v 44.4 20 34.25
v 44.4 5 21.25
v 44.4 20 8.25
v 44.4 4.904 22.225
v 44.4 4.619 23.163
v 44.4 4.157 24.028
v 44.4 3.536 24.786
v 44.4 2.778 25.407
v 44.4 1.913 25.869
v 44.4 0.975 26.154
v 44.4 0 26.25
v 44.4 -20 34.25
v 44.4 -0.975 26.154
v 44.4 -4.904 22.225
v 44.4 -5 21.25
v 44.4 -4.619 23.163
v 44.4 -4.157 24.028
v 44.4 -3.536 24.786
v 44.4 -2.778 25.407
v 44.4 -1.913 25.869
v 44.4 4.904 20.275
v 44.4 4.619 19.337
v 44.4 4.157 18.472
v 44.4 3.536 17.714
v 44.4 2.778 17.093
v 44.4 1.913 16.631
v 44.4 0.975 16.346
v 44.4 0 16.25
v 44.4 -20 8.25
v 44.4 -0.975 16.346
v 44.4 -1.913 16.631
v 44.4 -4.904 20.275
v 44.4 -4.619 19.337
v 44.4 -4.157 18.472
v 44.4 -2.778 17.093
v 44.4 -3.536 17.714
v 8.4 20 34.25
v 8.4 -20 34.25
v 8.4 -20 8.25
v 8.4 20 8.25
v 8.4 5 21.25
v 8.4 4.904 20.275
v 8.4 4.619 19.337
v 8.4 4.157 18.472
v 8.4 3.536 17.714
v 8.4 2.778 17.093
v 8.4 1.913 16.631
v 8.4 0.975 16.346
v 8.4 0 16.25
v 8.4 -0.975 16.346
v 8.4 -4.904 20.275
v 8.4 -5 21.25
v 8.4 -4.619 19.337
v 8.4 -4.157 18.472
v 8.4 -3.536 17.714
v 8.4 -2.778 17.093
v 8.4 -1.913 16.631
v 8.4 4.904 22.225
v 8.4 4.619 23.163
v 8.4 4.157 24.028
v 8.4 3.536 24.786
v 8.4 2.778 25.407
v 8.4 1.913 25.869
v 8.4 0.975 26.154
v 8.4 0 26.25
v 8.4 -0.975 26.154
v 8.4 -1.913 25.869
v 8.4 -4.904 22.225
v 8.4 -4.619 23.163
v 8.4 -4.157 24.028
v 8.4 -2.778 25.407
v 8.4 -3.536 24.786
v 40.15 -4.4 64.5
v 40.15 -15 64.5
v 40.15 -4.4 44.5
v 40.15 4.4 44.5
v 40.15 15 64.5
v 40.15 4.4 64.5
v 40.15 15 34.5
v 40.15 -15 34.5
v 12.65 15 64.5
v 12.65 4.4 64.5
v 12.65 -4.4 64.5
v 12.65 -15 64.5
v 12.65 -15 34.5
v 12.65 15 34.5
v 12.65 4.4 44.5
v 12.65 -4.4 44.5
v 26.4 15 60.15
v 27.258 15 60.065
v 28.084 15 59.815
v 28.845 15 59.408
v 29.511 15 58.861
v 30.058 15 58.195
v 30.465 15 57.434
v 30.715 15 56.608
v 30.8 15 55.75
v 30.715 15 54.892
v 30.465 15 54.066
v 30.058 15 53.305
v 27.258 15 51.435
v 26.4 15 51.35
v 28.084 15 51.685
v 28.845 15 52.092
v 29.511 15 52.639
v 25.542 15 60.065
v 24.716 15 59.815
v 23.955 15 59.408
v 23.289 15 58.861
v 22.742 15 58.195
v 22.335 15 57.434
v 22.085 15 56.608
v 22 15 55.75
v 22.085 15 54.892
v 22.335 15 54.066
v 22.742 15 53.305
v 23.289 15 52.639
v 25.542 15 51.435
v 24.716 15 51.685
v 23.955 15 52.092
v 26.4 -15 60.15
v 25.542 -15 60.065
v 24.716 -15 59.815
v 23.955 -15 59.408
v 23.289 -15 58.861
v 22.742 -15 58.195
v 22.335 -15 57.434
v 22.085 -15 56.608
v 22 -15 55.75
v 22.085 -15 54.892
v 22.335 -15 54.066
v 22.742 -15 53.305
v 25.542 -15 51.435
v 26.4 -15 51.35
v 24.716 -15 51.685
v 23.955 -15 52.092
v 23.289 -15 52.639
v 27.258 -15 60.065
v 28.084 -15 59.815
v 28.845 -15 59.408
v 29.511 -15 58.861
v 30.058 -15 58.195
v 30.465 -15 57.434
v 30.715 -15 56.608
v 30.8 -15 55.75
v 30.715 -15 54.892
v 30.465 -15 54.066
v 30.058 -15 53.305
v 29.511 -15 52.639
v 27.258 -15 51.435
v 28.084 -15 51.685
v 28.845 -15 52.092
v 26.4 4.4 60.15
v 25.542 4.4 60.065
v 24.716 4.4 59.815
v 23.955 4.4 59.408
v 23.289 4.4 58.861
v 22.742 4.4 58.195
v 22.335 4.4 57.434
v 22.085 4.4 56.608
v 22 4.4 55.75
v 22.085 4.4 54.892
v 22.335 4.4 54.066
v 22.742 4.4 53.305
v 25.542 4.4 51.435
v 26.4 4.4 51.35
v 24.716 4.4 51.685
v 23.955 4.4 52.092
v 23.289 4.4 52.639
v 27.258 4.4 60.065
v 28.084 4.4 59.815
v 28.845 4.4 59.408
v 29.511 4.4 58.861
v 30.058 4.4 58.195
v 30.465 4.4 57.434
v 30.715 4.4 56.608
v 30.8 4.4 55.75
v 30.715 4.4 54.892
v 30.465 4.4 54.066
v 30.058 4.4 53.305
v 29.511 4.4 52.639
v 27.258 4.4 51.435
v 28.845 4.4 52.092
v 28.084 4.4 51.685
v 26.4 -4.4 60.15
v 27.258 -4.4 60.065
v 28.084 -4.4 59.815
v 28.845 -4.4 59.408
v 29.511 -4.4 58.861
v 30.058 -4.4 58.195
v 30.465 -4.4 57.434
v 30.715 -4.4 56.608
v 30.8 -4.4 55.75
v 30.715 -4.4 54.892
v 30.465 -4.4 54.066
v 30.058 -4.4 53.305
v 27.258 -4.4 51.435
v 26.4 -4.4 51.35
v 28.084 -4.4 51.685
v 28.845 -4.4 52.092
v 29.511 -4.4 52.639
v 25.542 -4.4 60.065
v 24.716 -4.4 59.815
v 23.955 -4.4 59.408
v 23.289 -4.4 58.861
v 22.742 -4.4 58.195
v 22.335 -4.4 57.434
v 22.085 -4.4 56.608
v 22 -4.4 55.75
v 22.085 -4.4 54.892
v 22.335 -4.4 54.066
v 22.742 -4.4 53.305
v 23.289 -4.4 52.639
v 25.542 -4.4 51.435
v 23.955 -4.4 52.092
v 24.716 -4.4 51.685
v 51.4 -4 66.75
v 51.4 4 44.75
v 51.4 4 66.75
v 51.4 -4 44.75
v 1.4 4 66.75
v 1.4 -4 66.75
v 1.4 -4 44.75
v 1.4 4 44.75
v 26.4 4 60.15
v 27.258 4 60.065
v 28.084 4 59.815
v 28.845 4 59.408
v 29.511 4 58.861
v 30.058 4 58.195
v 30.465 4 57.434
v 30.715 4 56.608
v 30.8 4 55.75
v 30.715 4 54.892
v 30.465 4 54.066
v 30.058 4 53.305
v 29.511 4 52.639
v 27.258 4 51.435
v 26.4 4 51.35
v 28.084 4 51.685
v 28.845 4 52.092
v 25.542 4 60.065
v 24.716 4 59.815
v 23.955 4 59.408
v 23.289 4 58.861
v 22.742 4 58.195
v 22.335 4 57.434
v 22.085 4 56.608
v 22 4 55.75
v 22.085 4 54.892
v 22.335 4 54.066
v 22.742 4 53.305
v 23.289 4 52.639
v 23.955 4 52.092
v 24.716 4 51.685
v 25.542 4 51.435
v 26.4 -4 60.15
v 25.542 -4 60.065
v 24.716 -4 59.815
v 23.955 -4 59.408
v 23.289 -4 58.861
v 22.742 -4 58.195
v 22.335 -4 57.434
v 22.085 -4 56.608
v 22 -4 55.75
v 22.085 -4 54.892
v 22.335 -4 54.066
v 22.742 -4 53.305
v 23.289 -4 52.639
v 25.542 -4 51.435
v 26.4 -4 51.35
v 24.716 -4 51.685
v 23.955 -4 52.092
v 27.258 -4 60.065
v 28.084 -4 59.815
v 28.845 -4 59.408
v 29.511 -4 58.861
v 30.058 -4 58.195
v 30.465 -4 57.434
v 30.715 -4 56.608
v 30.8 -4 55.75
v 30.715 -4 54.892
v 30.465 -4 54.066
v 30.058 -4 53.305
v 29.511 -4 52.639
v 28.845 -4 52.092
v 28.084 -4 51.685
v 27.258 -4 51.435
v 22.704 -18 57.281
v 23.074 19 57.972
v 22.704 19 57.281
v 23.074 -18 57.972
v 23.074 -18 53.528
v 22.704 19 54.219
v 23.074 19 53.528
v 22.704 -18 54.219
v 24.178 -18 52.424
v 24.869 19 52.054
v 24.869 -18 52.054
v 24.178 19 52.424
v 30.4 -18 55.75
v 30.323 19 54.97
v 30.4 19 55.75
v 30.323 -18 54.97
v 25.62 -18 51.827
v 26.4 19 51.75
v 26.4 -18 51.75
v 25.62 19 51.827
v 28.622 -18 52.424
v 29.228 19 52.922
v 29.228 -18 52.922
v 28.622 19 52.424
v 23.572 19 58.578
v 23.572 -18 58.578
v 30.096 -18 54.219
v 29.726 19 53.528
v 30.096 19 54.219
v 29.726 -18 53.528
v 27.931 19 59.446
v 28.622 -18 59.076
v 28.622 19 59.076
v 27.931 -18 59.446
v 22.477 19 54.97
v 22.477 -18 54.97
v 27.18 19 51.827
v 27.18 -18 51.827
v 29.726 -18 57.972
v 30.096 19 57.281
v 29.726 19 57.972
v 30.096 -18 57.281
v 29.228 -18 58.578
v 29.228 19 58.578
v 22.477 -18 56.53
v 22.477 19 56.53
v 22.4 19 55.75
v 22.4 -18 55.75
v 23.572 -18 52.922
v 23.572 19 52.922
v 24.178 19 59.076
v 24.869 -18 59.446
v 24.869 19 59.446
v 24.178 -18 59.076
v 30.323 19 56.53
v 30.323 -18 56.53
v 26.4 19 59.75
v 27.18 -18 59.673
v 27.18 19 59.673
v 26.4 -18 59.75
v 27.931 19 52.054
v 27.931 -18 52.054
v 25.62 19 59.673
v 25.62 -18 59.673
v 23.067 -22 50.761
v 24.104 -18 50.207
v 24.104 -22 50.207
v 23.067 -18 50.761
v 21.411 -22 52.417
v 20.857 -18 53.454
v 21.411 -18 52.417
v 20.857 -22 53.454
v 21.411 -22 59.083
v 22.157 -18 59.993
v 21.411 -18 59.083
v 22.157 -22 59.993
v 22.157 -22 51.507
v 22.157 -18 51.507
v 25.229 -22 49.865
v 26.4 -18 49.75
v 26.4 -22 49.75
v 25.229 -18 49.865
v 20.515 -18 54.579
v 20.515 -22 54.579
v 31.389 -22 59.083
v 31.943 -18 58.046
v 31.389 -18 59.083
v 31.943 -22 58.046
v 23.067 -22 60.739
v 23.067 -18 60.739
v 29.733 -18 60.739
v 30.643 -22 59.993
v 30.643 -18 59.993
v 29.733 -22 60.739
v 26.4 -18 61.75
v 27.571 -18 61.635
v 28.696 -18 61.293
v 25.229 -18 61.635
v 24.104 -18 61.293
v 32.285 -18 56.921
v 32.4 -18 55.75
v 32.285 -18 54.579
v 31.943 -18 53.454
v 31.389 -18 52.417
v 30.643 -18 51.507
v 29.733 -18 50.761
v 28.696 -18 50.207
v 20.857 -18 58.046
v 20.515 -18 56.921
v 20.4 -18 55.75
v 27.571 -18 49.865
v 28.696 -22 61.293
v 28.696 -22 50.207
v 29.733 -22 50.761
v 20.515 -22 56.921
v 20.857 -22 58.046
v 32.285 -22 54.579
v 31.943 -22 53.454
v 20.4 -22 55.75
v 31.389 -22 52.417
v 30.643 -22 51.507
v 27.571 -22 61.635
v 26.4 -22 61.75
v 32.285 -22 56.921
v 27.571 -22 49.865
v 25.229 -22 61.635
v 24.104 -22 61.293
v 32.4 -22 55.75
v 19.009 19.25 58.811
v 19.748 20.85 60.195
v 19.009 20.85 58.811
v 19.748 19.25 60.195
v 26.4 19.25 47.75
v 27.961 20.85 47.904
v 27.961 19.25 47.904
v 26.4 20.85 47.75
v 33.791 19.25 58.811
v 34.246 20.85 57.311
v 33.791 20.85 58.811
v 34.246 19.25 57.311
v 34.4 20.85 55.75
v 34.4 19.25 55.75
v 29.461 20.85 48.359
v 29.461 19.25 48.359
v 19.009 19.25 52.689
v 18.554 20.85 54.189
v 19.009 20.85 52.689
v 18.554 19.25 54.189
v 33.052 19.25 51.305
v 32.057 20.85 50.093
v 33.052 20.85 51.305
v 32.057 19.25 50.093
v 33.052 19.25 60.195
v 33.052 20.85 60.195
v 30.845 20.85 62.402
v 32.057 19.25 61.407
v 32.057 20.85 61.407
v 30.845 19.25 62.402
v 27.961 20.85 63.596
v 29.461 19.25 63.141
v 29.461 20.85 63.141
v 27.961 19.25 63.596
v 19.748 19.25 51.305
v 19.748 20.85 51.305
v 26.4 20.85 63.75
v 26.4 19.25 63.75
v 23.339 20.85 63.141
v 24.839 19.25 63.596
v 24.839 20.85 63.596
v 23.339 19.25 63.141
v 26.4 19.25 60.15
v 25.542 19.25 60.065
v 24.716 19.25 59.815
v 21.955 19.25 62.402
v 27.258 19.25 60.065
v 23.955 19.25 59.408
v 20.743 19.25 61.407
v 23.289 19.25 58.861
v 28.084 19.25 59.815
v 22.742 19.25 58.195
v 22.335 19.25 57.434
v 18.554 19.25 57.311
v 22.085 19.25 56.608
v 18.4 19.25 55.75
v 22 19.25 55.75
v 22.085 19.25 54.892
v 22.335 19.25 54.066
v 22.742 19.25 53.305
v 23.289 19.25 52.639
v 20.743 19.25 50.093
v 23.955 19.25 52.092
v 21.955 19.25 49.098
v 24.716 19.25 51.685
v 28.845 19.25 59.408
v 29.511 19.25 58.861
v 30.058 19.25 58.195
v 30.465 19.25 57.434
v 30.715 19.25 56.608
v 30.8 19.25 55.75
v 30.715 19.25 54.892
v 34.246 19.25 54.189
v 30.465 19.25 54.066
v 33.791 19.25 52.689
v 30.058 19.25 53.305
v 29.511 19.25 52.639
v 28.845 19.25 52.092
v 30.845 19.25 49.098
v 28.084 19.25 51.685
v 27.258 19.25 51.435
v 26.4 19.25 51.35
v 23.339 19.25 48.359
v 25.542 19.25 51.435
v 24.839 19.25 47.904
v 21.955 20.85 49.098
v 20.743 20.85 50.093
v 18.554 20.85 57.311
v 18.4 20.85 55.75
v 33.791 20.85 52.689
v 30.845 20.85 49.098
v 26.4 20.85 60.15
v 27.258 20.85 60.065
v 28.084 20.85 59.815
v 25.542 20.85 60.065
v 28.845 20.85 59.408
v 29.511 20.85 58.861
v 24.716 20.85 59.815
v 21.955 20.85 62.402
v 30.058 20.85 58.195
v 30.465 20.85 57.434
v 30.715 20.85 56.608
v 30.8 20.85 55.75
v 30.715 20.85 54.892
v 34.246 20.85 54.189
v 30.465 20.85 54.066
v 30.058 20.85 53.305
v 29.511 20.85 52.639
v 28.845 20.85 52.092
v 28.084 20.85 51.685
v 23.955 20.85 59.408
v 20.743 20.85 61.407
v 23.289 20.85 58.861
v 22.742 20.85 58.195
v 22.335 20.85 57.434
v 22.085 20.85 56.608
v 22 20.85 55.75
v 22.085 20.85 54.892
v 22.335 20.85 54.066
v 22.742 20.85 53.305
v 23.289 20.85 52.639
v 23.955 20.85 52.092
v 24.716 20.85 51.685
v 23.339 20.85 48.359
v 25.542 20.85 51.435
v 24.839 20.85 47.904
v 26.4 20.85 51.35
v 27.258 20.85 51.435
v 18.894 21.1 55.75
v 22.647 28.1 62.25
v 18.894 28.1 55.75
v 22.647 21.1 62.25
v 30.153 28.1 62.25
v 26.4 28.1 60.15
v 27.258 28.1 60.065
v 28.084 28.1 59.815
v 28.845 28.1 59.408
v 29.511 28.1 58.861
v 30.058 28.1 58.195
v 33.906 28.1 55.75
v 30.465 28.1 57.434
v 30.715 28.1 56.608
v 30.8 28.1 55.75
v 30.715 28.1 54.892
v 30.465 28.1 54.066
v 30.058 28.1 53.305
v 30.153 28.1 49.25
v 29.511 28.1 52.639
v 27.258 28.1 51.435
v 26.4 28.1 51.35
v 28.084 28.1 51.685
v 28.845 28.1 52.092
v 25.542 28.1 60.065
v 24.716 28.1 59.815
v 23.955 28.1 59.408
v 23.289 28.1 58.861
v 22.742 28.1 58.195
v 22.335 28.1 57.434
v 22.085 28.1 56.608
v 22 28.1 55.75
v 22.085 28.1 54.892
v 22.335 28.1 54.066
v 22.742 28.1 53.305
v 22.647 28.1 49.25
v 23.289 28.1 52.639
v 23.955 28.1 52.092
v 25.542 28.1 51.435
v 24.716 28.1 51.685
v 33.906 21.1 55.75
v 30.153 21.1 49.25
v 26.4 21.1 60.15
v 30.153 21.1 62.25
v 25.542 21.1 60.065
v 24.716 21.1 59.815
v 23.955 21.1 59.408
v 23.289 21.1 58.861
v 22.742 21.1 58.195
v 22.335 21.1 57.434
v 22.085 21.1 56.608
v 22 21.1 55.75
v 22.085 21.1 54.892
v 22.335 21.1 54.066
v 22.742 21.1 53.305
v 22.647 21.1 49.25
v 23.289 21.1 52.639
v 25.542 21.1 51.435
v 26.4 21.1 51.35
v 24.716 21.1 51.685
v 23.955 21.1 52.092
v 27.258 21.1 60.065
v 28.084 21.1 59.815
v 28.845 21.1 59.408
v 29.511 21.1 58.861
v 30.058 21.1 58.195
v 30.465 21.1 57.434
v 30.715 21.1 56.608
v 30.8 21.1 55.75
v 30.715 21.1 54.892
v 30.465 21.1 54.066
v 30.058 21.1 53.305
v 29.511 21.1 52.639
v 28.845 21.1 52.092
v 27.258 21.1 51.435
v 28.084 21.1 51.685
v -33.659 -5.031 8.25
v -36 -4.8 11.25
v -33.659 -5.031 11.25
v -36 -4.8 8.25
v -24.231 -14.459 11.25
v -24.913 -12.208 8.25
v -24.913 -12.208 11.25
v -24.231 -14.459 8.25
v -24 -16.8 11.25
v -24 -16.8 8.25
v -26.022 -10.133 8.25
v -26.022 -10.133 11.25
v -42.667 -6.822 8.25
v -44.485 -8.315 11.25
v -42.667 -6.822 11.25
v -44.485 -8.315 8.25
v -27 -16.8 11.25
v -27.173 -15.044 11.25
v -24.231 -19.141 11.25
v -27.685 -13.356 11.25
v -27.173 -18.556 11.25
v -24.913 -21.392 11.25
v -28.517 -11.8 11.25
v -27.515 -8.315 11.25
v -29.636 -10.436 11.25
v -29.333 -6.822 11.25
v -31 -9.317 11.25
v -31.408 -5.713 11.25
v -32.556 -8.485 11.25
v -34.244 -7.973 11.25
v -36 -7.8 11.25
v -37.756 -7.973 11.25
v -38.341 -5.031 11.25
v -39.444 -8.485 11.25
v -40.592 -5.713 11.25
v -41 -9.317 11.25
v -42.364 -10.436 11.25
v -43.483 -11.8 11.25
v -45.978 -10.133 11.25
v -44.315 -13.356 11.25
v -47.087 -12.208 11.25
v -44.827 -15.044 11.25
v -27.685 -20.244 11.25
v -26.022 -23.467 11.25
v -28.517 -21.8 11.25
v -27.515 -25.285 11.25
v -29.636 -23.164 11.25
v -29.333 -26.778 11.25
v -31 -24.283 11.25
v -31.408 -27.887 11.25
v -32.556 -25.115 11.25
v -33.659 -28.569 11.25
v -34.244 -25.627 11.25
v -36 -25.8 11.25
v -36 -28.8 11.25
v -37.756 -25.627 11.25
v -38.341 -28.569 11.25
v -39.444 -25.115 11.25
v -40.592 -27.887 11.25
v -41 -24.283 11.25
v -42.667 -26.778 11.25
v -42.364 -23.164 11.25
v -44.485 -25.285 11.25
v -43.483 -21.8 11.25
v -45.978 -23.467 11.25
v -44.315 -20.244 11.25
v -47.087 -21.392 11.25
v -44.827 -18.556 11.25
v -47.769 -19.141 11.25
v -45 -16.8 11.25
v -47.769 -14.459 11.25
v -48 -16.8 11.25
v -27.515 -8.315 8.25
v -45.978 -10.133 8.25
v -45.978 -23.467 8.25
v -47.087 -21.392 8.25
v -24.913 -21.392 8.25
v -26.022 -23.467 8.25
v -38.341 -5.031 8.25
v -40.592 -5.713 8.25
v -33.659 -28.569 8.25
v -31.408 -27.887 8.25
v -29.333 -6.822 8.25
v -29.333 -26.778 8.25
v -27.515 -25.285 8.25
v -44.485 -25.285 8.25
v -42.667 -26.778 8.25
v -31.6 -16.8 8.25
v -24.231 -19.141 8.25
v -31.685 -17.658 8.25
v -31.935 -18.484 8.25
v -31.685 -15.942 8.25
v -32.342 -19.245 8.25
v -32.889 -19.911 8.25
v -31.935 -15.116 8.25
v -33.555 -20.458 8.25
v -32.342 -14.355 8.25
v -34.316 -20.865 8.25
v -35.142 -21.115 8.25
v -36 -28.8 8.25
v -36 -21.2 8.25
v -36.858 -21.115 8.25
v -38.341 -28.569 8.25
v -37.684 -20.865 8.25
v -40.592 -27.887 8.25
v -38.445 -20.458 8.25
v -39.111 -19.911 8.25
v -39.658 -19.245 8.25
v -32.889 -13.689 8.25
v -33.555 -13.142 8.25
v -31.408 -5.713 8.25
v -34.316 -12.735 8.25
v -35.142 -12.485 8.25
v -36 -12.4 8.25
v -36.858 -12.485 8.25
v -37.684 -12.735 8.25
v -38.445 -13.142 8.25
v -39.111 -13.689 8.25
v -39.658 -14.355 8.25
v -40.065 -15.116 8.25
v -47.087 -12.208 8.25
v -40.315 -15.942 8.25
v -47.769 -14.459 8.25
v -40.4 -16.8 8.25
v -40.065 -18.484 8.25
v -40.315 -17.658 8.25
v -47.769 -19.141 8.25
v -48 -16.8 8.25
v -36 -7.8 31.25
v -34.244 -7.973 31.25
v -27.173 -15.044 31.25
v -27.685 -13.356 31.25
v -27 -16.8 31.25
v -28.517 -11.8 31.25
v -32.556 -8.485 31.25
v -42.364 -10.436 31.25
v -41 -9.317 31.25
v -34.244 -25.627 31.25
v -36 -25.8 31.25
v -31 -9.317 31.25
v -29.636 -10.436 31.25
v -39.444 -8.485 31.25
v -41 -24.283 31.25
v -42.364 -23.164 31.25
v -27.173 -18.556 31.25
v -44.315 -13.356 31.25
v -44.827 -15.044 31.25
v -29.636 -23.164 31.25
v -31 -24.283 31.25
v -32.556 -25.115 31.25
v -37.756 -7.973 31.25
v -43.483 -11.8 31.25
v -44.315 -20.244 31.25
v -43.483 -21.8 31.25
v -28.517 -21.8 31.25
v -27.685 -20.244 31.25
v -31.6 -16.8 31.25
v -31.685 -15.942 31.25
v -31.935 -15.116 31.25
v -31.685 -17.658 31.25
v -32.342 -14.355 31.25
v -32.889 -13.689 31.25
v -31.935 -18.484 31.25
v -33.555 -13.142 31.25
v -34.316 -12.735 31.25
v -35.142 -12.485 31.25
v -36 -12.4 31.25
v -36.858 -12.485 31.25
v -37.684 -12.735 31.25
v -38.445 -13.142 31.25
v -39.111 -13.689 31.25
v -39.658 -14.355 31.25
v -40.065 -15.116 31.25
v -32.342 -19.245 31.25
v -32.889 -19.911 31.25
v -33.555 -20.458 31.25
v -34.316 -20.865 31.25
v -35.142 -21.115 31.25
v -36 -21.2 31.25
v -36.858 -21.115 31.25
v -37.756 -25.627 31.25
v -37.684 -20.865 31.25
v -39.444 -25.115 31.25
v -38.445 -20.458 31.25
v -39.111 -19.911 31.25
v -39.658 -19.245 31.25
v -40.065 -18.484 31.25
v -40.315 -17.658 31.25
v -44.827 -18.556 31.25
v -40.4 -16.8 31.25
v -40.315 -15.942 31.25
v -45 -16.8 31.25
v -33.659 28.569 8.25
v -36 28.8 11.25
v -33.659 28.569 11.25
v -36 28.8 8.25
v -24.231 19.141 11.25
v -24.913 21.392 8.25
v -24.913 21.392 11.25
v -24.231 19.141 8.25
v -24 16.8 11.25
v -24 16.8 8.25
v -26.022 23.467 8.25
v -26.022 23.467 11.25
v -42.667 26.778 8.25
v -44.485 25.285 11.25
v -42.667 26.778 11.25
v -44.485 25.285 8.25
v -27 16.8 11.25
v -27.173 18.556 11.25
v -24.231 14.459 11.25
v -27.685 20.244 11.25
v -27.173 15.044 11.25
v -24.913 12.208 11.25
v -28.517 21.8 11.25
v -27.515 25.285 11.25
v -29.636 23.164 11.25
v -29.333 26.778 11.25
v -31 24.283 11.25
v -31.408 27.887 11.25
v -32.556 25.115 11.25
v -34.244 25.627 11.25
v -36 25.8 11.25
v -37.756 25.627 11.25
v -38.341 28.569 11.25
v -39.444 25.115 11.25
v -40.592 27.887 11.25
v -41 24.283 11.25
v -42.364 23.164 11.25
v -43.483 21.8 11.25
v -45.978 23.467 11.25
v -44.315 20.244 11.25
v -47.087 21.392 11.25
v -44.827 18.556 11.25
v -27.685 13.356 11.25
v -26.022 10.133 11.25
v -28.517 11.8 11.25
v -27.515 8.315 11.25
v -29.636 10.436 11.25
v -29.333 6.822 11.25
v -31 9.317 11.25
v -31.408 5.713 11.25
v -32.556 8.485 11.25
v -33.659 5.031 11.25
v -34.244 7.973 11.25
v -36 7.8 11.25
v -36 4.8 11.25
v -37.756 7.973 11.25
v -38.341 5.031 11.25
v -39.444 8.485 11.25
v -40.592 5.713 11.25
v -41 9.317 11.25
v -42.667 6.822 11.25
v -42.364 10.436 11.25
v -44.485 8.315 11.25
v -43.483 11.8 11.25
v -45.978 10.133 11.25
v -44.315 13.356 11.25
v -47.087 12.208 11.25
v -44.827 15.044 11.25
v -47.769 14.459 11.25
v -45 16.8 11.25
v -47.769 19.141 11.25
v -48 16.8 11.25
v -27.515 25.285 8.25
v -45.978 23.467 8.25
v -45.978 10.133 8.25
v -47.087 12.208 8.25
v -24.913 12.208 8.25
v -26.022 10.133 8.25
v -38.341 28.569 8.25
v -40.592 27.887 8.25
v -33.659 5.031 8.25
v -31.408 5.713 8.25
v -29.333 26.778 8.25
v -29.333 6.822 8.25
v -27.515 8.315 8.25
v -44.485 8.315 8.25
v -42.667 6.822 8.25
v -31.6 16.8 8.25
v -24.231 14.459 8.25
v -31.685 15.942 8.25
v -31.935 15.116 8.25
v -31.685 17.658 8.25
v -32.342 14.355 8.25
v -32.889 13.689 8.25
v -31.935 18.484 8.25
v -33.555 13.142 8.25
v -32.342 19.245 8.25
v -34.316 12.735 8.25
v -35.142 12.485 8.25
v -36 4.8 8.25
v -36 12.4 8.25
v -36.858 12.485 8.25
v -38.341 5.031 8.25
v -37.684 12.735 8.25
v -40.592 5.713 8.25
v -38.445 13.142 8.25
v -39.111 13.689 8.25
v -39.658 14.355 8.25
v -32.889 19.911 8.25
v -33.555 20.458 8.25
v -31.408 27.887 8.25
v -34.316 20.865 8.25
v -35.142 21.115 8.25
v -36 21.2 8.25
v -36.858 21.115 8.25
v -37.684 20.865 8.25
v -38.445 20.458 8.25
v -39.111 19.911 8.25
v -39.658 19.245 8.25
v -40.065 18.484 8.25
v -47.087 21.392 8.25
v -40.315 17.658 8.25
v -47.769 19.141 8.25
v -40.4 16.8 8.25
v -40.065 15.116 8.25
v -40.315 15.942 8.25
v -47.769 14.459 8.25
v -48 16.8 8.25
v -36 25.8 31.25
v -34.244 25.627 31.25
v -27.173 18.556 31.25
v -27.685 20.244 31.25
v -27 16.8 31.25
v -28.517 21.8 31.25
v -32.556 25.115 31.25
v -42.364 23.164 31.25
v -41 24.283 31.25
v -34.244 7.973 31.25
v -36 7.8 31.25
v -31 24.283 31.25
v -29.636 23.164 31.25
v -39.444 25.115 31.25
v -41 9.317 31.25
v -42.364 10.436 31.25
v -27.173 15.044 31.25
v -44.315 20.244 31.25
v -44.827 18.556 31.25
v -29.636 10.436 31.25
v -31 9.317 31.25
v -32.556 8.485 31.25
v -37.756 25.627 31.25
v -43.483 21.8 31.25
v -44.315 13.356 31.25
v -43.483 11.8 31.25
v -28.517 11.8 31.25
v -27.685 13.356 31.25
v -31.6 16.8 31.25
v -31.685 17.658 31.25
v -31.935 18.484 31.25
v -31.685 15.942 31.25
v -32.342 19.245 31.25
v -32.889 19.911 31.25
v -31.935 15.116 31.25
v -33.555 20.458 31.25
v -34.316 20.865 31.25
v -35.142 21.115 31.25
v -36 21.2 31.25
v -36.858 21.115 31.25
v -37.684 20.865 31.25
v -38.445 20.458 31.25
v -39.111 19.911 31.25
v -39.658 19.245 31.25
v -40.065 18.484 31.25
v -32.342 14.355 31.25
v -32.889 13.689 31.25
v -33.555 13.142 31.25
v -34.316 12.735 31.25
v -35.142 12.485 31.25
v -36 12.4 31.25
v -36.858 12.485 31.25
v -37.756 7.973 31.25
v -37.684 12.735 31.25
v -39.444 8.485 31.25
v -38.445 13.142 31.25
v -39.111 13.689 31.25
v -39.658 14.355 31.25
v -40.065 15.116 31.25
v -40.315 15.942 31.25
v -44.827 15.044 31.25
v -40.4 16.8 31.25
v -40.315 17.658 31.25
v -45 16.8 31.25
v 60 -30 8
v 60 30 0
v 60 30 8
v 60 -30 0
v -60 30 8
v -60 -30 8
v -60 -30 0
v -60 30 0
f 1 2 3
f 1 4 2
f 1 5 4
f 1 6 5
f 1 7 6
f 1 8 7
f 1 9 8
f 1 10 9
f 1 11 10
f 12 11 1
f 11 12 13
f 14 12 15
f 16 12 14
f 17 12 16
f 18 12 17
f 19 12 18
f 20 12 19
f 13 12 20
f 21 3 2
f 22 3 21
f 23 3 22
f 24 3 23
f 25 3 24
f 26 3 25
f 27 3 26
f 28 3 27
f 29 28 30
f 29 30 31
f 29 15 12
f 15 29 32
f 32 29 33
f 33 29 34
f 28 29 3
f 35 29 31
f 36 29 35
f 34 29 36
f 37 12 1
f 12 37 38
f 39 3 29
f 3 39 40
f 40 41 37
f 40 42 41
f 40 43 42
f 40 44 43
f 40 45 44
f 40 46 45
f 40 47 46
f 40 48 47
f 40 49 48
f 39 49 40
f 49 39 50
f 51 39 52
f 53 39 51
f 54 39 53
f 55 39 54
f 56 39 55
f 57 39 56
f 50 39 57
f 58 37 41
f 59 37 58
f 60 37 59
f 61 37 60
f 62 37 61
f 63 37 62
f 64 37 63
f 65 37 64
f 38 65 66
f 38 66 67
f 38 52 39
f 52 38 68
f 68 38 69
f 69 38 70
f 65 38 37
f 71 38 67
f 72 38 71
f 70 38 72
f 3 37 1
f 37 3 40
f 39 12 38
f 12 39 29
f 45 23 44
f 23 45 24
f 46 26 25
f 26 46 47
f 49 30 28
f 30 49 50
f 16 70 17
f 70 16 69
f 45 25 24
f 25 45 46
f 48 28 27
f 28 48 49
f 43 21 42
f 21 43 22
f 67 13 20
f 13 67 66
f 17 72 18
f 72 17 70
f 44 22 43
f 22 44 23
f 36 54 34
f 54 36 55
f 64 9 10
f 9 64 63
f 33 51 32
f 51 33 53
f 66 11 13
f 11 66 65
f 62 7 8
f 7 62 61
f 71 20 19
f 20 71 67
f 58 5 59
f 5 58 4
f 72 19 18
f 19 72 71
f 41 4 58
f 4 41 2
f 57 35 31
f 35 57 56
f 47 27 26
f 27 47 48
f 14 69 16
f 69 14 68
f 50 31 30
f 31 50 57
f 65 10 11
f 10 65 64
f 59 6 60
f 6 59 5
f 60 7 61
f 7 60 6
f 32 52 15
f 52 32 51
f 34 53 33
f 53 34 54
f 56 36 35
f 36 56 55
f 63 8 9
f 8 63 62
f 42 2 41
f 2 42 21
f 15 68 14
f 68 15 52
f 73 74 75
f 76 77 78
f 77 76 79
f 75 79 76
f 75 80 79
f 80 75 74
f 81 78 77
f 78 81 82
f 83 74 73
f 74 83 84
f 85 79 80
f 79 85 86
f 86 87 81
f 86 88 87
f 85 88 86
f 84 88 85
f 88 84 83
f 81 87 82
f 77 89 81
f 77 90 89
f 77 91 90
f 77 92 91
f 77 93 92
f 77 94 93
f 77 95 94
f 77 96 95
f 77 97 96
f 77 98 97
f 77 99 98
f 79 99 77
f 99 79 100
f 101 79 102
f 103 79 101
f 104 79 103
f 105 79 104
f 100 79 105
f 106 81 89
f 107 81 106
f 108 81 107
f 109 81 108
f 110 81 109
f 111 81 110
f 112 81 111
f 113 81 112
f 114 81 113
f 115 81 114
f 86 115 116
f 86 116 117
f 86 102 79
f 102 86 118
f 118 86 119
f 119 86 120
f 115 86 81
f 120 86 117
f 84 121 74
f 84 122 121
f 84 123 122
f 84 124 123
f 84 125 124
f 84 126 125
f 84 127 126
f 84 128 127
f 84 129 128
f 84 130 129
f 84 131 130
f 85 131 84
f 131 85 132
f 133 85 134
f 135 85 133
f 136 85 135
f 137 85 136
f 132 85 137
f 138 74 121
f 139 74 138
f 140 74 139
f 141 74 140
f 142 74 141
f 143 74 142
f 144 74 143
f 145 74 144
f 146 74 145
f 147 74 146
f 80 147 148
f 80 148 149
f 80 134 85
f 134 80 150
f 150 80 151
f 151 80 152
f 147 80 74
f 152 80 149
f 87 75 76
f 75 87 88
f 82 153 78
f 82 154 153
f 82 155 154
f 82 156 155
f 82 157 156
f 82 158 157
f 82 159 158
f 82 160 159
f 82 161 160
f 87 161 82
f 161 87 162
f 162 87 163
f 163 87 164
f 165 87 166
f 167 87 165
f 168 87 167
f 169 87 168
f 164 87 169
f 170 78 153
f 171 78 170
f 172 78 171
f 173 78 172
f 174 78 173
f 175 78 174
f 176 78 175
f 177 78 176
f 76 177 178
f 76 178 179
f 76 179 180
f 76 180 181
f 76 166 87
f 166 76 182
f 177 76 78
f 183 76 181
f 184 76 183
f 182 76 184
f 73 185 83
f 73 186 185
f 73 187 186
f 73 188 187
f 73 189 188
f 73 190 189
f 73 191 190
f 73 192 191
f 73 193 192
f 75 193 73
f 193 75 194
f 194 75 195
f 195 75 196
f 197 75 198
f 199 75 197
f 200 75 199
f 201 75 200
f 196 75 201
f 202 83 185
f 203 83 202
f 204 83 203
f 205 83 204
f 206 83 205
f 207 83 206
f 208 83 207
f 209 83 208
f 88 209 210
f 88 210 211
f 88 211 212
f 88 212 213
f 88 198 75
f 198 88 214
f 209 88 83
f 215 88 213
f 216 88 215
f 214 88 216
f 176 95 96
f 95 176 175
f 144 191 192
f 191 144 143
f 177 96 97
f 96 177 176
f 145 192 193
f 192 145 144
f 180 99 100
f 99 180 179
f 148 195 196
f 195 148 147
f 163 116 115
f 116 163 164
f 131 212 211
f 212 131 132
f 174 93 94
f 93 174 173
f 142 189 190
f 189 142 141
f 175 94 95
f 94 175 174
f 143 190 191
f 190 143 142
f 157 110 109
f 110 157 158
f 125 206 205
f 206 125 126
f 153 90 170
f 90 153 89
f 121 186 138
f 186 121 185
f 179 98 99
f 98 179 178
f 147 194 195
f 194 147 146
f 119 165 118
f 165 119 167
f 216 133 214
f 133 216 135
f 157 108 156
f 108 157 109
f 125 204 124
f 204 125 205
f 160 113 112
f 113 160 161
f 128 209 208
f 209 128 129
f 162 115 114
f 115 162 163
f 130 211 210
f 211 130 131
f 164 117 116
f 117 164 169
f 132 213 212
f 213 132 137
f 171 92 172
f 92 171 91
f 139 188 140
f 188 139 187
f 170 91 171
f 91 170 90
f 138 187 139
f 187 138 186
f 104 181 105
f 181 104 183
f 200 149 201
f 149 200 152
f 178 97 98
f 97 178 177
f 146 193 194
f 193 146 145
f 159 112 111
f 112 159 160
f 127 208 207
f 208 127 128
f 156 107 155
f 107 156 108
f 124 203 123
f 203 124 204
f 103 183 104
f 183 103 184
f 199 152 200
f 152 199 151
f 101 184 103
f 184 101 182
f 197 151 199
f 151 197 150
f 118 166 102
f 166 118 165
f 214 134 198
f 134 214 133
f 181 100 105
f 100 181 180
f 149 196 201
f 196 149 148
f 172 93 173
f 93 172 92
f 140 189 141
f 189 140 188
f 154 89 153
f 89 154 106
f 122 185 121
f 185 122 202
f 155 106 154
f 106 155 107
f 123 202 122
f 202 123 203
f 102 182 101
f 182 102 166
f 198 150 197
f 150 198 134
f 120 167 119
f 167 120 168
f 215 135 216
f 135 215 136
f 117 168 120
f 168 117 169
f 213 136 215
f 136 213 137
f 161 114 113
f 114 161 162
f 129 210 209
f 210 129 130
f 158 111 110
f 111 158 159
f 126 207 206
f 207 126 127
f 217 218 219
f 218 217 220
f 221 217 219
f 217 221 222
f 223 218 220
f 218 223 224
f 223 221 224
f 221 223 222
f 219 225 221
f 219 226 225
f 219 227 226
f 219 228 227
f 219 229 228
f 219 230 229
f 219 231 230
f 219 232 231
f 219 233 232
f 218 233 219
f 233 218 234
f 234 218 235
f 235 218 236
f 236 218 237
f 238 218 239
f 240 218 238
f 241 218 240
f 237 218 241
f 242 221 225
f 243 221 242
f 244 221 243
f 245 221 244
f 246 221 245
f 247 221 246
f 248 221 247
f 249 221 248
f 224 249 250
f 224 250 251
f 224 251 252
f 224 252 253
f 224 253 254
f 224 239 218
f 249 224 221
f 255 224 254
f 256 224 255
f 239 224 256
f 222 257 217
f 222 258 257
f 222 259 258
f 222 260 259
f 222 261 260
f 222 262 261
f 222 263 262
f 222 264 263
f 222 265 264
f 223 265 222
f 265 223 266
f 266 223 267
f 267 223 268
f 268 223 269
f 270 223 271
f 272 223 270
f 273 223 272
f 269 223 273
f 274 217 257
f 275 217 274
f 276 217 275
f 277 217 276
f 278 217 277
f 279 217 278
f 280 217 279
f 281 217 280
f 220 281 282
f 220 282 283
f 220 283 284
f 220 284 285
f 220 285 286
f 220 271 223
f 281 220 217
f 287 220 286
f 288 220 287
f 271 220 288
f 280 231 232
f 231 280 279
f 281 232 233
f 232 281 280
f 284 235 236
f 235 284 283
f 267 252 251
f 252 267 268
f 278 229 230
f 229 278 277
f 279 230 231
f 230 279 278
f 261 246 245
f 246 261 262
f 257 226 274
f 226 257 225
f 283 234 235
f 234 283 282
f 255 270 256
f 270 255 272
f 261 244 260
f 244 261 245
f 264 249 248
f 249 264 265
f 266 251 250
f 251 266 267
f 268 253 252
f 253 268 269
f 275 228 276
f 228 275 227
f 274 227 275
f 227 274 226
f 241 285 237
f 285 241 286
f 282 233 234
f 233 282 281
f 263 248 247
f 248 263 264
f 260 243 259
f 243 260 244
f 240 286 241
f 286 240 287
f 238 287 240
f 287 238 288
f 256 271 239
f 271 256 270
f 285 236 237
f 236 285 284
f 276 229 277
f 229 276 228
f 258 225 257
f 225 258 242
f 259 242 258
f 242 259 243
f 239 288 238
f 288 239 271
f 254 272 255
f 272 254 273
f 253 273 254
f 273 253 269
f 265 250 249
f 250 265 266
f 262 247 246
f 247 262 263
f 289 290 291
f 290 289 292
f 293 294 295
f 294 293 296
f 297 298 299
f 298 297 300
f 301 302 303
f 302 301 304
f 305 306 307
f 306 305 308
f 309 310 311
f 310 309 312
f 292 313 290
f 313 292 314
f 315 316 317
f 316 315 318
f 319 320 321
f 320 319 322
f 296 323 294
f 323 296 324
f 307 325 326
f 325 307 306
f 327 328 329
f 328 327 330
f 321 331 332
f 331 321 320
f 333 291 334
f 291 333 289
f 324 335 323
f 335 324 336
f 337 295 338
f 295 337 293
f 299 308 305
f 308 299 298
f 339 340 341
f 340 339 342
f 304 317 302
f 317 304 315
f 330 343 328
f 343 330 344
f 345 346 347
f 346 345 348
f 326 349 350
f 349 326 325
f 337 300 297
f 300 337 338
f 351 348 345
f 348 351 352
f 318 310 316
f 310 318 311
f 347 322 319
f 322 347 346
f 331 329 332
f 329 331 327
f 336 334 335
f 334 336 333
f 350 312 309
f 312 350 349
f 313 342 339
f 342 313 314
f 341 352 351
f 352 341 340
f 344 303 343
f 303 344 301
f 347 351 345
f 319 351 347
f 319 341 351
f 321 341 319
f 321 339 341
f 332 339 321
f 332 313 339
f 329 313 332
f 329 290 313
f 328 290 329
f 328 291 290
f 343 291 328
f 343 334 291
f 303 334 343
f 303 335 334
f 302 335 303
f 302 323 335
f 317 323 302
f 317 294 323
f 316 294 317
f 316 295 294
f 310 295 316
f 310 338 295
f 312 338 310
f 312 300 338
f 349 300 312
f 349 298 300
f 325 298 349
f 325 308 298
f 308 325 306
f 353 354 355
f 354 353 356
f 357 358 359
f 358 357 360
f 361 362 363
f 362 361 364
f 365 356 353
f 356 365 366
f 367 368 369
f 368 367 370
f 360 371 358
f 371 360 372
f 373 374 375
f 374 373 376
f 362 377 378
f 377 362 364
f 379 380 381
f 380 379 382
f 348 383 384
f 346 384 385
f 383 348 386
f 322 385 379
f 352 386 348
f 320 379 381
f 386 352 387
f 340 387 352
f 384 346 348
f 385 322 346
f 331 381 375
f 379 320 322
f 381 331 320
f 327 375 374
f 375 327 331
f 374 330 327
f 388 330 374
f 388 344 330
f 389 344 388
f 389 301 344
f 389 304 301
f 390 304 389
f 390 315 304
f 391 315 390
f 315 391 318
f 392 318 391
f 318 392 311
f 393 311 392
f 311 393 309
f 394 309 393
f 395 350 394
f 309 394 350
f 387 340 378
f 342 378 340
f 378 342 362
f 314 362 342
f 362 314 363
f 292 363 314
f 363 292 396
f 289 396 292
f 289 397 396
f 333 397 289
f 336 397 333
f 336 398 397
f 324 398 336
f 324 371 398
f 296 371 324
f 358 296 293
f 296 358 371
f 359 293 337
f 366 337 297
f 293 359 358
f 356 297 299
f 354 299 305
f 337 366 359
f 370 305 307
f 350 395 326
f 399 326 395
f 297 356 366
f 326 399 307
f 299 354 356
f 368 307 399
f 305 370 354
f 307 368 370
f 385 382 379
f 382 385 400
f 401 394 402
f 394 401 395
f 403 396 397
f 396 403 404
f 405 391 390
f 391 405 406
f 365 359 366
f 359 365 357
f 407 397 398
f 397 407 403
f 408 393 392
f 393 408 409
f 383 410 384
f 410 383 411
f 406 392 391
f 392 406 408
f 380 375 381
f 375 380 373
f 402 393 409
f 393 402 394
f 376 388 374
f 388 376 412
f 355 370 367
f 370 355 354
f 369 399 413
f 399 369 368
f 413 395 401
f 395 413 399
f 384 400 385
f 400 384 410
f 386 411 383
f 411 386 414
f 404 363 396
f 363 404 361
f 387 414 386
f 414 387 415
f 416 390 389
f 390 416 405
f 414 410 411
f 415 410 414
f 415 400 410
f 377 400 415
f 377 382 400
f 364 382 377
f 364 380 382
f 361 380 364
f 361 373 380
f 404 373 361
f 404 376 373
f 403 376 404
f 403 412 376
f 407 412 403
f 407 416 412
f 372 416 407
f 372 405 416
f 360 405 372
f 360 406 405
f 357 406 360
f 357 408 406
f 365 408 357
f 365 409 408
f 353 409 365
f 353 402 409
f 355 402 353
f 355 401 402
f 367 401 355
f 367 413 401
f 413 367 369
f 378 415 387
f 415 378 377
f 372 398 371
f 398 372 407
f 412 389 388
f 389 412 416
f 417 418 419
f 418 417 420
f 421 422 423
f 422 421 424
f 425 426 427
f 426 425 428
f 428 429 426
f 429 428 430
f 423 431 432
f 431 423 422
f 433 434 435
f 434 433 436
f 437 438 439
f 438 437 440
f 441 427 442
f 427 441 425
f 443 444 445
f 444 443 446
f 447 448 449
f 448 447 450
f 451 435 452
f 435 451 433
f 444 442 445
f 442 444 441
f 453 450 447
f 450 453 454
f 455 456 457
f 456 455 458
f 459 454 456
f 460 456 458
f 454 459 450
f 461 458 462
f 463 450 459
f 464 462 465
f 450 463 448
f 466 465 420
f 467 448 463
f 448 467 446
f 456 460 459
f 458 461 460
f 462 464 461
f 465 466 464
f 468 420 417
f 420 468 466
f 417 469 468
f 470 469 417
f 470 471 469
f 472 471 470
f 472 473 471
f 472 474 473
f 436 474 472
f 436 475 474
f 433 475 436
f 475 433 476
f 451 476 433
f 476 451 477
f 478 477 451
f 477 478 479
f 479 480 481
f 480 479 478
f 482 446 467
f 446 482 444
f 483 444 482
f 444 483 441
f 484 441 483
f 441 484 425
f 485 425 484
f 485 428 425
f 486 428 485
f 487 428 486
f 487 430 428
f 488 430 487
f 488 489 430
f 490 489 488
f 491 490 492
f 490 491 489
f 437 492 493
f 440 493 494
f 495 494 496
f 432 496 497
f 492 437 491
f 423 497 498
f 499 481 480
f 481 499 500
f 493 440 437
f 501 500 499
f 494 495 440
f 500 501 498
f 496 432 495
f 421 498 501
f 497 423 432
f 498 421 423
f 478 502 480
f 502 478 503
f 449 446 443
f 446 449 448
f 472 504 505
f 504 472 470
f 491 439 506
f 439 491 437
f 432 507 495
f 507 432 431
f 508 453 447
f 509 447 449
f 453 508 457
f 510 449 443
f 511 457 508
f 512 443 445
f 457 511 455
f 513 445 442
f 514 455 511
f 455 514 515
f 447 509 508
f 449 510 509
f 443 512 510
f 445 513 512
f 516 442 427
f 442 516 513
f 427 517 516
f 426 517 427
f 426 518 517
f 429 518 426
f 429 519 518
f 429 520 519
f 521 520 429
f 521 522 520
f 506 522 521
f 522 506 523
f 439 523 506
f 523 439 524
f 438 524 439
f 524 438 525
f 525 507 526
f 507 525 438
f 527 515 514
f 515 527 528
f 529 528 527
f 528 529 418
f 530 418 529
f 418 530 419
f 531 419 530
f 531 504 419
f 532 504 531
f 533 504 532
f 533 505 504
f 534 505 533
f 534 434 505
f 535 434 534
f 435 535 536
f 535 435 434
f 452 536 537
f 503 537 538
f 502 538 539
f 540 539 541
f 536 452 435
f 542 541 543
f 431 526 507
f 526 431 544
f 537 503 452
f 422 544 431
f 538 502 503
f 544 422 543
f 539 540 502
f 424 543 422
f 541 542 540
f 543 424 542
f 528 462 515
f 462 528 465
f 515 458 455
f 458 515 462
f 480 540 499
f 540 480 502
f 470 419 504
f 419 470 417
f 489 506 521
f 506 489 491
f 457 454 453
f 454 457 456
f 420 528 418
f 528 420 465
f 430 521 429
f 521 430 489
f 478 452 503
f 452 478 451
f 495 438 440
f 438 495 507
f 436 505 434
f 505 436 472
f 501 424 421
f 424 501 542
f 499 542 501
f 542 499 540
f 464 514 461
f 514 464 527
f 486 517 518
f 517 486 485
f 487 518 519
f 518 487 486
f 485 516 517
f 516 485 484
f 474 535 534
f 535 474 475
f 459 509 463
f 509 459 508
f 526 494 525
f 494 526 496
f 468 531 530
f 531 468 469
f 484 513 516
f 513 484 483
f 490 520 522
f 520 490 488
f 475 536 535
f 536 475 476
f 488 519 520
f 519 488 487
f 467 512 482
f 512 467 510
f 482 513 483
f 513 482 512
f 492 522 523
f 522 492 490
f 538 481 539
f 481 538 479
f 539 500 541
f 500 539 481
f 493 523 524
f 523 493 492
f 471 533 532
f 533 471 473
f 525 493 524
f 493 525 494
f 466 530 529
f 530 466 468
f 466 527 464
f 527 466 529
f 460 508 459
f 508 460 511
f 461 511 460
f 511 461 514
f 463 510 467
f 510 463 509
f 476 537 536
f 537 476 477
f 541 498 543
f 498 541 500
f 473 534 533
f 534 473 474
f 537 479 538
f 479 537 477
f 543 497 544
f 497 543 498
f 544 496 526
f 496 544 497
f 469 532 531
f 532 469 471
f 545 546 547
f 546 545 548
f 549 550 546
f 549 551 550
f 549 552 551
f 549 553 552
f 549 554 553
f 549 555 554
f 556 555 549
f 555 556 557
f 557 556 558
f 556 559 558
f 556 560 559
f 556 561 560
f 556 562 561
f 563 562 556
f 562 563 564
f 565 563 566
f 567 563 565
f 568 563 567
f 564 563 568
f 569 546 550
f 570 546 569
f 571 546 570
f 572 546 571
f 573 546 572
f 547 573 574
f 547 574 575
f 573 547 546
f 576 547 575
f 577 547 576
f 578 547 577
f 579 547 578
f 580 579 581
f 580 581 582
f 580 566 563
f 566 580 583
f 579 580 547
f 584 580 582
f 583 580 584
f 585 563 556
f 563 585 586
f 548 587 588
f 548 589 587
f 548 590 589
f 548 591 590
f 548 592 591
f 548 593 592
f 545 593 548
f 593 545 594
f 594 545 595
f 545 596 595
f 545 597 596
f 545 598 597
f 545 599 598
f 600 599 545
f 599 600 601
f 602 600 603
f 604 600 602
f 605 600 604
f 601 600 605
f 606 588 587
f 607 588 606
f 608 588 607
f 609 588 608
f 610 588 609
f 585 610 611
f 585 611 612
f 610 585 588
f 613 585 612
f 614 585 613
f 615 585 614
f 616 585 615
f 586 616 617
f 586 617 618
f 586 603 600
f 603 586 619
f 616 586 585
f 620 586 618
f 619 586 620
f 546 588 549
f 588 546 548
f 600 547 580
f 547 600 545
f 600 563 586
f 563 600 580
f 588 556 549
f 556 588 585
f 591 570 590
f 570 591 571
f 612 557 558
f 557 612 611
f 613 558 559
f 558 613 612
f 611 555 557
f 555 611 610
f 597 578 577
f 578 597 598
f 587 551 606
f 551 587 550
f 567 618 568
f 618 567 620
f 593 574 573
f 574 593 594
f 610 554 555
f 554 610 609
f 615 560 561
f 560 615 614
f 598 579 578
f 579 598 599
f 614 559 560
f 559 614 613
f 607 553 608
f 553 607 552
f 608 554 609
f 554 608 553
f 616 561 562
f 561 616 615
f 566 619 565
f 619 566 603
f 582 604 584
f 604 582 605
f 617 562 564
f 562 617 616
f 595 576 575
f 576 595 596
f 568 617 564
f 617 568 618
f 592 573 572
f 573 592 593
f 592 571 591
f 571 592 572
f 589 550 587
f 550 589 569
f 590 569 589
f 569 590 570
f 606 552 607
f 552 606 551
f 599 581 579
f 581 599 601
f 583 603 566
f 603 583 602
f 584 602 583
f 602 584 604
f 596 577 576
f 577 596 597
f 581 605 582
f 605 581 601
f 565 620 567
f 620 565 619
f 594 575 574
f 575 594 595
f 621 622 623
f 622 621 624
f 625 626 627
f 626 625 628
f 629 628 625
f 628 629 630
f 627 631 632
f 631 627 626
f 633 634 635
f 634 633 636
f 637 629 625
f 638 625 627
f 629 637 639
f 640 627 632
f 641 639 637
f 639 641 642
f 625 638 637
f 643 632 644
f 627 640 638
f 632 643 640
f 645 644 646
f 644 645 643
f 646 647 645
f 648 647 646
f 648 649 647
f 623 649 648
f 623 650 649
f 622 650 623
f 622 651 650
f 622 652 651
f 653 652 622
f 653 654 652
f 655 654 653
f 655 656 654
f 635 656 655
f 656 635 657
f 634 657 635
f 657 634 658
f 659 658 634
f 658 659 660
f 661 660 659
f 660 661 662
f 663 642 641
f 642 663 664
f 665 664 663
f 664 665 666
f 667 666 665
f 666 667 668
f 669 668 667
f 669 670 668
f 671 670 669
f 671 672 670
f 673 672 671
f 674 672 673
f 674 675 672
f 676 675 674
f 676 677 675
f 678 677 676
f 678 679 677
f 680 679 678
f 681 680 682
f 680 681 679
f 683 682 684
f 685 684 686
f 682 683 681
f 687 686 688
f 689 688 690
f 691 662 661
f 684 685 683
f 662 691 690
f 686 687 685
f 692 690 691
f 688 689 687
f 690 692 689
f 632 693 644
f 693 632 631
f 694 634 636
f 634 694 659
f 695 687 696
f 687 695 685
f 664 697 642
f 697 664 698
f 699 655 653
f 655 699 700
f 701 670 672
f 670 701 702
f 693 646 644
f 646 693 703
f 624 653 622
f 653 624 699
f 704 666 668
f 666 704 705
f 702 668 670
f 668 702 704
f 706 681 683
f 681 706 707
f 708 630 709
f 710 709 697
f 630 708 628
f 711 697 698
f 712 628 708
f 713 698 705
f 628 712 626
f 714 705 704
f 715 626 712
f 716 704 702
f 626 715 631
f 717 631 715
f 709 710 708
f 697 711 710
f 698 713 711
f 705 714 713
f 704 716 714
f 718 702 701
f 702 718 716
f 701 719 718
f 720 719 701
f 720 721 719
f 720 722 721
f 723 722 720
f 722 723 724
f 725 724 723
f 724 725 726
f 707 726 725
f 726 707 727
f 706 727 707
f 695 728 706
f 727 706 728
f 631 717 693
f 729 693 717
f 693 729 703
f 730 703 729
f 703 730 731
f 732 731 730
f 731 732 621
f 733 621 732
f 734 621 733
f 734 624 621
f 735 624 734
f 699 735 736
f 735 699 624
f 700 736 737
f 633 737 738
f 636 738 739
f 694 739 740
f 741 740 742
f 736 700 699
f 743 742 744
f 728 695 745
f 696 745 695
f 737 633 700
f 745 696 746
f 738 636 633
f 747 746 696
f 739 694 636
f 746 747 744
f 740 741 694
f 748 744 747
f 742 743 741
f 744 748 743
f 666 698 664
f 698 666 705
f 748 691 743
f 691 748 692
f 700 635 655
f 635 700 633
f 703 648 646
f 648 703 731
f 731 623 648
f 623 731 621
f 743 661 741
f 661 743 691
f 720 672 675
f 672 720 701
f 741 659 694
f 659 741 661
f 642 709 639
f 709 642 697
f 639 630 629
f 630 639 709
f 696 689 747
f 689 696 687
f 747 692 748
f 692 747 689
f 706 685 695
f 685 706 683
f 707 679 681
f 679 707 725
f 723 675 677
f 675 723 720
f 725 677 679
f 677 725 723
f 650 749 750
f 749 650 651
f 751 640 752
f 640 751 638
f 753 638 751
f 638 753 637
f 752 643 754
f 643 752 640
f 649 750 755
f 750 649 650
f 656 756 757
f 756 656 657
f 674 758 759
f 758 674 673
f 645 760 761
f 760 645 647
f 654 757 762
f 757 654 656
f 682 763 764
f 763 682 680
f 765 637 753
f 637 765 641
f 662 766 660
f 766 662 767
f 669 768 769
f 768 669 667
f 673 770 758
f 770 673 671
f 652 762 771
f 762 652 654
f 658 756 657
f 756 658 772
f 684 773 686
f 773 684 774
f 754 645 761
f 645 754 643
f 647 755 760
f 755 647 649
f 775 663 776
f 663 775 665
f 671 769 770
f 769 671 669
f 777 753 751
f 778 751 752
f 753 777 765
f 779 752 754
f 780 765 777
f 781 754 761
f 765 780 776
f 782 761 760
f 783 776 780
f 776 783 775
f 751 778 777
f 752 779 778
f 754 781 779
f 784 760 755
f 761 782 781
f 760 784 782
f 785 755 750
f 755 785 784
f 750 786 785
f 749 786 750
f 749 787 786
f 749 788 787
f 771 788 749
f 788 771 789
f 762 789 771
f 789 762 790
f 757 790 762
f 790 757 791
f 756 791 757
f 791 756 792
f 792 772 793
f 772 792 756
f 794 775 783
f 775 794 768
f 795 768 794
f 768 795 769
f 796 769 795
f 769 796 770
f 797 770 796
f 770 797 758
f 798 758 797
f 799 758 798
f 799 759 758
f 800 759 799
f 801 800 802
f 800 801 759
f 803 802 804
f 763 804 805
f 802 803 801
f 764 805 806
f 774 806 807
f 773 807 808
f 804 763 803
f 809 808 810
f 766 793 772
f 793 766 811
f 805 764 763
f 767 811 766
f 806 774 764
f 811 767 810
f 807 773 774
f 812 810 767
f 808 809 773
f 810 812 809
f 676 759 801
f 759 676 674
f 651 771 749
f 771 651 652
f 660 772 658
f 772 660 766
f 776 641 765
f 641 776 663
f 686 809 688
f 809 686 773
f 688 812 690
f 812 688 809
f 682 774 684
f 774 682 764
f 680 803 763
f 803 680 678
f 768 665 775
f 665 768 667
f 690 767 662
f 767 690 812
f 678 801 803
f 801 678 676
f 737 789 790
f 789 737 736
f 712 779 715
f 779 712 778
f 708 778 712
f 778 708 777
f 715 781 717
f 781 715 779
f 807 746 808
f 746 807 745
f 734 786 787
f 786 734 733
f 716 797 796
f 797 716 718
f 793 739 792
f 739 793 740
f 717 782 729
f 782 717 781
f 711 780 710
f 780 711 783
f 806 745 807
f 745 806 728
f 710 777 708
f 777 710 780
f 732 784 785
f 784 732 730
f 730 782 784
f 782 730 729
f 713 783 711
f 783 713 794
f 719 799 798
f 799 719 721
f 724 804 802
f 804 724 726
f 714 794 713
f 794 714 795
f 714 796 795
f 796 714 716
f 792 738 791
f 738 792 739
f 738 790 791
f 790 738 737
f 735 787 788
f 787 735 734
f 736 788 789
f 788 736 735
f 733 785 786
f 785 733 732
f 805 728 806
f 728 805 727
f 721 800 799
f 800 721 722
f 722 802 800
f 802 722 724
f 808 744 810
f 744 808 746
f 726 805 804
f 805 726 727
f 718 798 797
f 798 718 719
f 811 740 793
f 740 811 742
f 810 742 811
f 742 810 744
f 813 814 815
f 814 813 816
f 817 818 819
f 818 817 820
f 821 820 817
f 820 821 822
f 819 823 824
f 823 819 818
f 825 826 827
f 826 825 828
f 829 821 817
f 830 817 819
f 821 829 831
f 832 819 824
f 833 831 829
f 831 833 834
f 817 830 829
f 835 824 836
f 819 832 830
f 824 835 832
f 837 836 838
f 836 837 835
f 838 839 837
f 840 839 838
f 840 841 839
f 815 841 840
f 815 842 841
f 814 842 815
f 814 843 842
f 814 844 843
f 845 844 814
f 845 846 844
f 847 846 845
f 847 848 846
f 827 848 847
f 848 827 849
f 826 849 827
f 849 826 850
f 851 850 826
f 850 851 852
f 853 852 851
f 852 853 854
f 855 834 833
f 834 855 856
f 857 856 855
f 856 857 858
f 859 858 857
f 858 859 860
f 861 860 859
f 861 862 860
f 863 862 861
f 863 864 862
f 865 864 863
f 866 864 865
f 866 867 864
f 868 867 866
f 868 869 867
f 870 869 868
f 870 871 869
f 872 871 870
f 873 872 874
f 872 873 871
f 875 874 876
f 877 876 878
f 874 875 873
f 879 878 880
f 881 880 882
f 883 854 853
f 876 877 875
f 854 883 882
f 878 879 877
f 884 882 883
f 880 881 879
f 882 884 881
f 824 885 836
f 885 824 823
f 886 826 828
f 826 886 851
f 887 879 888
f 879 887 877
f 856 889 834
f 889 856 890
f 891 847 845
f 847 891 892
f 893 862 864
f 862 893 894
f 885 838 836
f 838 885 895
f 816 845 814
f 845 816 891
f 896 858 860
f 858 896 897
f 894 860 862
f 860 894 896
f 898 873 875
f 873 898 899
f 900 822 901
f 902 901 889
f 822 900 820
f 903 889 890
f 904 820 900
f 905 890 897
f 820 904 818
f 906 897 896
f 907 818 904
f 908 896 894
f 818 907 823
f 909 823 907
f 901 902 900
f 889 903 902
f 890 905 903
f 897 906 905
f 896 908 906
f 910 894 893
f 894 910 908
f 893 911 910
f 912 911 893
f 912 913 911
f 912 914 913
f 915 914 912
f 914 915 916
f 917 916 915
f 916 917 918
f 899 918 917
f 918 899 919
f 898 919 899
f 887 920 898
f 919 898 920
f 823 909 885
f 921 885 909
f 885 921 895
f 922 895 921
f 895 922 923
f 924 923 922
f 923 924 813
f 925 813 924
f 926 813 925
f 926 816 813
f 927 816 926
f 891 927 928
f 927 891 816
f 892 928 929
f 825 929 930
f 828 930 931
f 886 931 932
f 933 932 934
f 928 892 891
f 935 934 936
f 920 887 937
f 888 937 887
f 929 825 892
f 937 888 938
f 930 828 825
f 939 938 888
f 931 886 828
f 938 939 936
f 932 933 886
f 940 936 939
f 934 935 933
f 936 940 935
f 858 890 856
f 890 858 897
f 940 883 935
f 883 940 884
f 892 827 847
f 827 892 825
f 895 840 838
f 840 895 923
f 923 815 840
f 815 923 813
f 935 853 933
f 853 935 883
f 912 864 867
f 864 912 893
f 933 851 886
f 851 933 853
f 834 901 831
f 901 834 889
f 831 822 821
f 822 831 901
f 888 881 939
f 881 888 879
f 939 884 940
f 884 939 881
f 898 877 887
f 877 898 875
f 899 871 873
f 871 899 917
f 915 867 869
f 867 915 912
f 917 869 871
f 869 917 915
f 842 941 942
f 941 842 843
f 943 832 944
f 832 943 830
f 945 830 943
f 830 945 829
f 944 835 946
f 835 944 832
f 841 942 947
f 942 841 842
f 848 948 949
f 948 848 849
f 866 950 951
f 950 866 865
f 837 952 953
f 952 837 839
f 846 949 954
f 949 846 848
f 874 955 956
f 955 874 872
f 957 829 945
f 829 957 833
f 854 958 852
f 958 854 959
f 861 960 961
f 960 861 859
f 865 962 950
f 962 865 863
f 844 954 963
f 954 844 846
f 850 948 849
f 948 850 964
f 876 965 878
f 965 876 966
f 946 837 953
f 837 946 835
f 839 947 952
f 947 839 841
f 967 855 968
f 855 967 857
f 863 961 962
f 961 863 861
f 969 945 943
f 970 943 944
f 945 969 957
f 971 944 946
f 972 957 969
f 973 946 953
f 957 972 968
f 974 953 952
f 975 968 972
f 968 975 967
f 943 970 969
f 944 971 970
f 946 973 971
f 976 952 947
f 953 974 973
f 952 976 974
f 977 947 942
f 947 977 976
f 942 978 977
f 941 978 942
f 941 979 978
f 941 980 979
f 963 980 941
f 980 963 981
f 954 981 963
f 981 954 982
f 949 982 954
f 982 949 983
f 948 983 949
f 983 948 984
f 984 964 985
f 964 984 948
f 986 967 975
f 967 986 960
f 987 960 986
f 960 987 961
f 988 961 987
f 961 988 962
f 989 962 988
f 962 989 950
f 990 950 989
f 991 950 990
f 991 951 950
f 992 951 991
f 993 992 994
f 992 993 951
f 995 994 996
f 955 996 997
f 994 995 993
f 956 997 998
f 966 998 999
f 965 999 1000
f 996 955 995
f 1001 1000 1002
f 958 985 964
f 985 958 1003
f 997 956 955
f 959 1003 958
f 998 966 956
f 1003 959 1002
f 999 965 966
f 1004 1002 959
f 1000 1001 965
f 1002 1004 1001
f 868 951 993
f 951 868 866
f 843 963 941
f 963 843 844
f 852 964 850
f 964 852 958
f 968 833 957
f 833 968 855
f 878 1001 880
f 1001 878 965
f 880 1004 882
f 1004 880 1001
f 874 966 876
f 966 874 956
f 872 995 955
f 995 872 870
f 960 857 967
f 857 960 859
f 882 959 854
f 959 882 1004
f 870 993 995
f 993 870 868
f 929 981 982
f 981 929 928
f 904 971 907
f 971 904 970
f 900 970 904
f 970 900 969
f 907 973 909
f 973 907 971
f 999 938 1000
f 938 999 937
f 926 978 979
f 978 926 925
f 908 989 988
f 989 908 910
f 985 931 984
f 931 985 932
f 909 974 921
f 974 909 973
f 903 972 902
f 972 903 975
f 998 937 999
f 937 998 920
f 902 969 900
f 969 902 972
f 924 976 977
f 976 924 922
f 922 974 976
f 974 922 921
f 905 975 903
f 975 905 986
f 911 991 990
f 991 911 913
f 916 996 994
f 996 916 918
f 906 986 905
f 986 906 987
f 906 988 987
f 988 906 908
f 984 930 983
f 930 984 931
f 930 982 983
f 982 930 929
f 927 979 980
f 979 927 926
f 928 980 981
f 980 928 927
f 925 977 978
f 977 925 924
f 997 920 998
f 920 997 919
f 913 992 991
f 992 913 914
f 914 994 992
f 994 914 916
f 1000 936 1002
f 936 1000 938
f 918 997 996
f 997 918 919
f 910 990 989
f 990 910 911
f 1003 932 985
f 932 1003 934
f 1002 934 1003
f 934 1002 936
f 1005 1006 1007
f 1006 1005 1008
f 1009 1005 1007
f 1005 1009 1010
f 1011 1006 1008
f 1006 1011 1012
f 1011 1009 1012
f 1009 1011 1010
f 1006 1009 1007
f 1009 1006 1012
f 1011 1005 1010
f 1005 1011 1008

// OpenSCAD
$fn = 32;

// ------------------------------------------------------------------------
// Indexing jig: plate 120 x 60 mm, pin d8
// Every part is its own module, assembly() places every instance.
// ------------------------------------------------------------------------

// --- part 1 ---
module jig_plate() {
  difference() {
    translate([-60, -30, 0]) cube([120, 60, 8]);
  }
}

// --- part 2 ---
module locator_block() {
  difference() {
    translate([-18, -20, 0]) cube([36, 40, 26]);
    translate([0, 0, 13]) rotate([0, 90, 0]) cylinder(h = 38, d = 10, center = true);
  }
}

// --- part 3 ---
module index_fork() {
  difference() {
    translate([-13.75, -15, 0]) cube([27.5, 30, 30]);
    translate([-14.75, -4.4, 10]) cube([29.5, 8.8, 21]);
    translate([0, 0, 21.25]) rotate([90, 0, 0]) cylinder(h = 32, d = 8.8, center = true);
  }
}

// --- part 4 ---
module index_arm() {
  difference() {
    translate([-25, -4, 0]) cube([50, 8, 22]);
    translate([0, 0, 11]) rotate([90, 0, 0]) cylinder(h = 10, d = 8.8, center = true);
  }
}

// --- part 5 ---
module index_pin() {
  rotate([0, 90, 0]) cylinder(h = 38, d = 8, center = true);
  translate([-22, 0, 0]) rotate([0, 90, 0]) cylinder(h = 4, d = 12);
}

// --- part 6 ---
module pin_washer() {
  difference() {
      translate([0, 0, 0]) cylinder(h = 1.6, d = 16);
      translate([0, 0, -1]) cylinder(h = 3.6, d = 8.8);
    }
}

// --- part 7 ---
module lock_nut() {
  difference() {
    linear_extrude(height = 7) polygon(points = [[7.506, 0], [3.753, 6.5], [-3.753, 6.5], [-7.506, 0], [-3.753, -6.5], [3.753, -6.5]]);
    translate([0, 0, -1]) cylinder(h = 9, d = 8.8);
  }
}

// --- part 8 ---
module guide_bush_a() {
  difference() {
    union() {
      cylinder(h = 3, d = 24);
      translate([0, 0, 3]) cylinder(h = 20, d = 18);
    }
    translate([0, 0, -1]) cylinder(h = 25, d = 8.8);
  }
}

// --- part 9 ---
module guide_bush_b() {
  difference() {
    union() {
      cylinder(h = 3, d = 24);
      translate([0, 0, 3]) cylinder(h = 20, d = 18);
    }
    translate([0, 0, -1]) cylinder(h = 25, d = 8.8);
  }
}

// --- assembly ---
module assembly() {
  color([0.80, 0.24, 0.20]) translate([0, 0, 0]) rotate([0, 0, 0]) jig_plate();
  color([0.20, 0.45, 0.75]) translate([26.4, 0, 8.25]) rotate([0, 0, 0]) locator_block();
  color([0.25, 0.62, 0.32]) translate([26.4, 0, 34.5]) rotate([0, 0, 0]) index_fork();
  color([0.92, 0.70, 0.18]) translate([26.4, 0, 44.75]) rotate([0, 0, 0]) index_arm();
  color([0.58, 0.35, 0.70]) translate([26.4, 0, 55.75]) rotate([0, 0, 90]) index_pin();
  color([0.16, 0.66, 0.66]) translate([26.4, 20.85, 55.75]) rotate([90, 0, 0]) pin_washer();
  color([0.85, 0.48, 0.18]) translate([26.4, 28.1, 55.75]) rotate([90, 0, 0]) lock_nut();
  color([0.55, 0.60, 0.65]) translate([-36, -16.8, 8.25]) rotate([0, 0, 0]) guide_bush_a();
  color([0.75, 0.30, 0.55]) translate([-36, 16.8, 8.25]) rotate([0, 0, 0]) guide_bush_b();
}

assembly();
